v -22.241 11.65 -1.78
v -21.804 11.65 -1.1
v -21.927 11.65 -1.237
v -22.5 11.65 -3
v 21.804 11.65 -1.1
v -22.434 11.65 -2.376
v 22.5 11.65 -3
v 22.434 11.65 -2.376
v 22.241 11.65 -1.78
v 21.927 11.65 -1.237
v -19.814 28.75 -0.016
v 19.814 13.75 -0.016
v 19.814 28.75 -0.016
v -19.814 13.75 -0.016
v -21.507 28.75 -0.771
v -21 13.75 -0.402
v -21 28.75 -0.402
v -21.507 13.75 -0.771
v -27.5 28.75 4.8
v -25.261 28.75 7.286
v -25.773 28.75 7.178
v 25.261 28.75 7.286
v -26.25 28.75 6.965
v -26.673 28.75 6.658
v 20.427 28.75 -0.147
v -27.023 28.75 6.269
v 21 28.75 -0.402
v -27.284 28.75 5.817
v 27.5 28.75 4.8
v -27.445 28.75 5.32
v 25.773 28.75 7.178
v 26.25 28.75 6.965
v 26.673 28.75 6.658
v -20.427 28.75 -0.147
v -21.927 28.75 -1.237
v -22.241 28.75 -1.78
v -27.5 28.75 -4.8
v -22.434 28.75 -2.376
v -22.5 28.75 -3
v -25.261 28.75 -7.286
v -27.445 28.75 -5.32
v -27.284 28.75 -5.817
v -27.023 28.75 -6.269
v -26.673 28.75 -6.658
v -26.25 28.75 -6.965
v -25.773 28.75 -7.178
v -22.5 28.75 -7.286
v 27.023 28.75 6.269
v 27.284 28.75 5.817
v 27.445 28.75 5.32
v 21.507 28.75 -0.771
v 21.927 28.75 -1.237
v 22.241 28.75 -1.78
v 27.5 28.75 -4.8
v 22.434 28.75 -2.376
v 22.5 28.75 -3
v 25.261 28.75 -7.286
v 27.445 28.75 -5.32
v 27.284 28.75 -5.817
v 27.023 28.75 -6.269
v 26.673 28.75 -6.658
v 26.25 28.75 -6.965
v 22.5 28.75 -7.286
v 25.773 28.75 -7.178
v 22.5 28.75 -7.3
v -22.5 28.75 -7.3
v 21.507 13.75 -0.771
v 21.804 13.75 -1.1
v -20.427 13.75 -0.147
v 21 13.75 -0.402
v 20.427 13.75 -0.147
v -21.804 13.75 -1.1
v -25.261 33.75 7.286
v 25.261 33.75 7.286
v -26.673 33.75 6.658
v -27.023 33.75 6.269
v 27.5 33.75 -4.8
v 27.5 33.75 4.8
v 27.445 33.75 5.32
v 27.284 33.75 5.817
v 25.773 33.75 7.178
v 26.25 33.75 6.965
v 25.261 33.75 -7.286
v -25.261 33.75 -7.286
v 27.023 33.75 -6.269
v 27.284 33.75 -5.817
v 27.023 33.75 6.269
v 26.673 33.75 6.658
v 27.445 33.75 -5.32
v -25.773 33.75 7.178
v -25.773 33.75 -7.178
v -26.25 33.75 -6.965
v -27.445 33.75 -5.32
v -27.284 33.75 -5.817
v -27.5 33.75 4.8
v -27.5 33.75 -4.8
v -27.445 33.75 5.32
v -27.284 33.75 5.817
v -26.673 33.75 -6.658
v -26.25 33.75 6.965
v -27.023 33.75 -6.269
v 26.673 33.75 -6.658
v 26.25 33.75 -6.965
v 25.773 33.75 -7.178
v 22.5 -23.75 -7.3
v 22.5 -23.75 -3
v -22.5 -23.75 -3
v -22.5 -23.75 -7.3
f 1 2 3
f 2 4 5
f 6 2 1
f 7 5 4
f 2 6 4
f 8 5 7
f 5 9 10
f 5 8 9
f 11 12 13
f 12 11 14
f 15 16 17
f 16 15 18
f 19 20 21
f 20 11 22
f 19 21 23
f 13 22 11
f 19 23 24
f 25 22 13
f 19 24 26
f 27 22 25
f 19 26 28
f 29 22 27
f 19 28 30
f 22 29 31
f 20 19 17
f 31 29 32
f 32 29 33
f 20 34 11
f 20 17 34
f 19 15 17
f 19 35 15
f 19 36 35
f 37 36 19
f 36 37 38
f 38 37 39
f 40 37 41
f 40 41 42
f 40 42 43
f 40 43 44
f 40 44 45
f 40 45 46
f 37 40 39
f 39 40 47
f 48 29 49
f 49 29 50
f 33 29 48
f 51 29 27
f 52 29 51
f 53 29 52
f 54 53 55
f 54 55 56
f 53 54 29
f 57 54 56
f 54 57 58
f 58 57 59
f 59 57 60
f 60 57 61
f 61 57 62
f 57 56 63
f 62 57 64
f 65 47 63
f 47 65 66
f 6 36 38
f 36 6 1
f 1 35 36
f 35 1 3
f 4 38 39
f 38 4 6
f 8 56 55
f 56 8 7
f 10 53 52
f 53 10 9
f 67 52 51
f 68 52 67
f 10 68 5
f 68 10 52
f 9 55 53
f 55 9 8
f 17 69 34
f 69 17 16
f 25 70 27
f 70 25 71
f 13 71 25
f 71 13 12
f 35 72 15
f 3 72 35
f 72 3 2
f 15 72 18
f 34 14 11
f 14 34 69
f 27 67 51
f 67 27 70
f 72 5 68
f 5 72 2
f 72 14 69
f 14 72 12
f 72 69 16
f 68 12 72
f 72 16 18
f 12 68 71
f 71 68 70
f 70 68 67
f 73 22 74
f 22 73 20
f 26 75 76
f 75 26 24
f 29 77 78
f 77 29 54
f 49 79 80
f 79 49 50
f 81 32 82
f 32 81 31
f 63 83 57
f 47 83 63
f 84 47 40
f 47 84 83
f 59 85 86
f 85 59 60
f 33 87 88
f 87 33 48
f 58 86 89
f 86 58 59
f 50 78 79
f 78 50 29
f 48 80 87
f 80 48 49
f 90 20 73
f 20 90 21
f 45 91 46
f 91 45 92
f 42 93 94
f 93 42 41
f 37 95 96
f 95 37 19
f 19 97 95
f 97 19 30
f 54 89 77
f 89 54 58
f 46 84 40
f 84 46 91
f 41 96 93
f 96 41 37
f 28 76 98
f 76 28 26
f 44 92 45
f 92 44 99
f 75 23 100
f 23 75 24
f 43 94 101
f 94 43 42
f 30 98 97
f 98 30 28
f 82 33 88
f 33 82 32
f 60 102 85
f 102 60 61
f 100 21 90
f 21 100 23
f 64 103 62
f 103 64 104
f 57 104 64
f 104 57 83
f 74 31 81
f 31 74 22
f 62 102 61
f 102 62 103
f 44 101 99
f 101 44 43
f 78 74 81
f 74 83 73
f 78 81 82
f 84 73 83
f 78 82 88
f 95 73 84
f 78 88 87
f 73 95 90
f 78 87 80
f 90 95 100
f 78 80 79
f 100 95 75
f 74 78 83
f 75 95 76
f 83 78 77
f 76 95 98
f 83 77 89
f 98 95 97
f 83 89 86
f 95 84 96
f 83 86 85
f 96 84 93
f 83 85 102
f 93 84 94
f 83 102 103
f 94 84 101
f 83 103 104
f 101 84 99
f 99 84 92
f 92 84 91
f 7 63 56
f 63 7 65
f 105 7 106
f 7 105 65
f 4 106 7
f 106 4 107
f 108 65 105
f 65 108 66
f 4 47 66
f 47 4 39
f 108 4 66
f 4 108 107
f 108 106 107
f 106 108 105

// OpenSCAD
// View the tool base, cover, or both.
part = "cover"; // [base:Base Only,cover:Cover Only,assembly:Full Assembly,both:Base and Cover]

print_part();

/* [CPU Dimensions] */

// Total width of the CPU's PCB.
cpu_width = 45;
// Total depth of the CPU's PCB.
cpu_depth = 42.5;
// Total height of the entire CPU (including the IHS).
cpu_height = 4.6;

// Total height of just the PCB.
pcb_height = 1.6;
// Height of the lip (thin base) of the IHS.
lip_height = 1.1;
// Depth of the lip (thin base) on the IHS.
lip_depth = 2.1;
// Cutout width for the middle of some new lake-generation processors.
lip_cutout = 0;

/* [Box Margins] */

// Margin on the X sides of the tool.
width_margin = 5; // [2:1:10]
box_width = cpu_width + width_margin * 2;
// Margin on the Y sides of the tool.
depth_margin = 5; // [2:1:10]
box_depth = cpu_depth + depth_margin * 3;
// Margin on the top and bottom of the tool.
height_margin = 5; // [2:1:10]
box_height = cpu_height + height_margin * 2;
// Clearance for the components on the bottom of the CPU.
bottom_clearance = 2; // [1:0.2:3]
// Margin to the sides of the components on the bottom of the CPU.
bottom_margin = 20; //[2:1:10]

/* [Hidden] */

// Resolution quality of the curves and fillets.
$fn = 30;

cover_height = cpu_height - pcb_height;
fillet_radius = (height_margin + depth_margin) / 4;

// Make a cube with four rounded sides.
module roundcube(xyz, r, center=false) {
    translate(center ? -[xyz[0] / 2, xyz[1] / 2, xyz[2] / 2] : []) hull() {
        translate([r,          r,          0]) cylinder(h=xyz[2], r=r);
        translate([r,          xyz[1] - r, 0]) cylinder(h=xyz[2], r=r);
        translate([xyz[0] - r, r,          0]) cylinder(h=xyz[2], r=r);
        translate([xyz[0] - r, xyz[1] - r, 0]) cylinder(h=xyz[2], r=r);
    }
}

// Total geometry of the tool base.
module print_base() {
    difference() {
        // The main cube to cut from.
        rotate([90]) roundcube([box_width, box_height, box_depth], fillet_radius, center=true);

        // Large section on top, half cube.
        translate([0, depth_margin / 2 + 0.5, box_height / 4 + 0.5])
            cube([cpu_width, cpu_depth + depth_margin * 2 + 1, box_height / 2 + 1], center=true);

        // PCB cutout.
        translate([0, depth_margin / 2, -pcb_height / 2 + 0.5])
            cube([cpu_width, cpu_depth, pcb_height + 1], center=true);

        // Bottom components clearance.
        translate([0, depth_margin / 2, -pcb_height / 2 - bottom_clearance / 2 + 0.5])
            cube([cpu_width - bottom_margin * 2, cpu_depth - bottom_margin * 2, bottom_clearance + 1], center=true);
    }
}

// Total geometry of the tool cover.
module print_cover() {
    // translate([0, -depth_margin])
    union() {
        // Round cube for the front part.
        translate([0, box_depth / 2 + depth_margin / 2]) rotate([90])
            roundcube([box_width, box_height, depth_margin], fillet_radius, center=true);

        difference() {
            // Filleted cube for the part pressuring the IHS.
            translate([0, box_depth / 2 - depth_margin * 1.5 - lip_depth / 2, -cover_height]) hull() {
                translate([ cpu_width / 2 - cover_height, 0, 0]) rotate([90])
                    cylinder(r=cover_height, h=depth_margin * 3 + lip_depth, center=true);
                translate([-cpu_width / 2 + cover_height, 0, 0]) rotate([90])
                    cylinder(r=cover_height, h=depth_margin * 3 + lip_depth, center=true);
            }

            // Cutout for the IHS lip.
            translate([0, -lip_depth / 2 + box_depth / 2 - depth_margin * 3 - 0.5, -lip_height / 2 + 0.5])
                cube([cpu_width, lip_depth + 1, lip_height + 1], center=true);

            // Cutout in the middle for some newer processors.
            translate([0, -lip_depth / 2 + box_depth / 2 - depth_margin * 3 - 0.5, -cover_height / 2 + 0.5])
                cube([lip_cutout, lip_depth + 1, cover_height + 1], center=true);
        }

        // Main top part of the cover.
        translate([0, depth_margin / 2, -box_height / 4 - cover_height / 2])
            cube([cpu_width, box_depth - depth_margin, box_height / 2 - cover_height], center=true);
    }
}

// Select the part to calculate by the part variable.
module print_part() {
    if (part == "base") { // View tool base.
        print_base();
    } else if (part == "cover") { // View tool cover.
        print_cover();
    } else if (part == "assembly") { // View tool assembly.
        color([1, 1, 0, 0.5]) translate([0, -depth_margin / 2]) print_base();
        color([0, 1, 1, 0.5]) translate([0,  depth_margin / 2]) rotate([0, 180]) print_cover();
    } else { // View tool spread out, printable form. Includes both option.
        translate([-box_width / 2 - 5, 0 / 2, 0]) print_base();
        translate([ box_width / 2 + 5, 0,     0]) print_cover();
    }
}
